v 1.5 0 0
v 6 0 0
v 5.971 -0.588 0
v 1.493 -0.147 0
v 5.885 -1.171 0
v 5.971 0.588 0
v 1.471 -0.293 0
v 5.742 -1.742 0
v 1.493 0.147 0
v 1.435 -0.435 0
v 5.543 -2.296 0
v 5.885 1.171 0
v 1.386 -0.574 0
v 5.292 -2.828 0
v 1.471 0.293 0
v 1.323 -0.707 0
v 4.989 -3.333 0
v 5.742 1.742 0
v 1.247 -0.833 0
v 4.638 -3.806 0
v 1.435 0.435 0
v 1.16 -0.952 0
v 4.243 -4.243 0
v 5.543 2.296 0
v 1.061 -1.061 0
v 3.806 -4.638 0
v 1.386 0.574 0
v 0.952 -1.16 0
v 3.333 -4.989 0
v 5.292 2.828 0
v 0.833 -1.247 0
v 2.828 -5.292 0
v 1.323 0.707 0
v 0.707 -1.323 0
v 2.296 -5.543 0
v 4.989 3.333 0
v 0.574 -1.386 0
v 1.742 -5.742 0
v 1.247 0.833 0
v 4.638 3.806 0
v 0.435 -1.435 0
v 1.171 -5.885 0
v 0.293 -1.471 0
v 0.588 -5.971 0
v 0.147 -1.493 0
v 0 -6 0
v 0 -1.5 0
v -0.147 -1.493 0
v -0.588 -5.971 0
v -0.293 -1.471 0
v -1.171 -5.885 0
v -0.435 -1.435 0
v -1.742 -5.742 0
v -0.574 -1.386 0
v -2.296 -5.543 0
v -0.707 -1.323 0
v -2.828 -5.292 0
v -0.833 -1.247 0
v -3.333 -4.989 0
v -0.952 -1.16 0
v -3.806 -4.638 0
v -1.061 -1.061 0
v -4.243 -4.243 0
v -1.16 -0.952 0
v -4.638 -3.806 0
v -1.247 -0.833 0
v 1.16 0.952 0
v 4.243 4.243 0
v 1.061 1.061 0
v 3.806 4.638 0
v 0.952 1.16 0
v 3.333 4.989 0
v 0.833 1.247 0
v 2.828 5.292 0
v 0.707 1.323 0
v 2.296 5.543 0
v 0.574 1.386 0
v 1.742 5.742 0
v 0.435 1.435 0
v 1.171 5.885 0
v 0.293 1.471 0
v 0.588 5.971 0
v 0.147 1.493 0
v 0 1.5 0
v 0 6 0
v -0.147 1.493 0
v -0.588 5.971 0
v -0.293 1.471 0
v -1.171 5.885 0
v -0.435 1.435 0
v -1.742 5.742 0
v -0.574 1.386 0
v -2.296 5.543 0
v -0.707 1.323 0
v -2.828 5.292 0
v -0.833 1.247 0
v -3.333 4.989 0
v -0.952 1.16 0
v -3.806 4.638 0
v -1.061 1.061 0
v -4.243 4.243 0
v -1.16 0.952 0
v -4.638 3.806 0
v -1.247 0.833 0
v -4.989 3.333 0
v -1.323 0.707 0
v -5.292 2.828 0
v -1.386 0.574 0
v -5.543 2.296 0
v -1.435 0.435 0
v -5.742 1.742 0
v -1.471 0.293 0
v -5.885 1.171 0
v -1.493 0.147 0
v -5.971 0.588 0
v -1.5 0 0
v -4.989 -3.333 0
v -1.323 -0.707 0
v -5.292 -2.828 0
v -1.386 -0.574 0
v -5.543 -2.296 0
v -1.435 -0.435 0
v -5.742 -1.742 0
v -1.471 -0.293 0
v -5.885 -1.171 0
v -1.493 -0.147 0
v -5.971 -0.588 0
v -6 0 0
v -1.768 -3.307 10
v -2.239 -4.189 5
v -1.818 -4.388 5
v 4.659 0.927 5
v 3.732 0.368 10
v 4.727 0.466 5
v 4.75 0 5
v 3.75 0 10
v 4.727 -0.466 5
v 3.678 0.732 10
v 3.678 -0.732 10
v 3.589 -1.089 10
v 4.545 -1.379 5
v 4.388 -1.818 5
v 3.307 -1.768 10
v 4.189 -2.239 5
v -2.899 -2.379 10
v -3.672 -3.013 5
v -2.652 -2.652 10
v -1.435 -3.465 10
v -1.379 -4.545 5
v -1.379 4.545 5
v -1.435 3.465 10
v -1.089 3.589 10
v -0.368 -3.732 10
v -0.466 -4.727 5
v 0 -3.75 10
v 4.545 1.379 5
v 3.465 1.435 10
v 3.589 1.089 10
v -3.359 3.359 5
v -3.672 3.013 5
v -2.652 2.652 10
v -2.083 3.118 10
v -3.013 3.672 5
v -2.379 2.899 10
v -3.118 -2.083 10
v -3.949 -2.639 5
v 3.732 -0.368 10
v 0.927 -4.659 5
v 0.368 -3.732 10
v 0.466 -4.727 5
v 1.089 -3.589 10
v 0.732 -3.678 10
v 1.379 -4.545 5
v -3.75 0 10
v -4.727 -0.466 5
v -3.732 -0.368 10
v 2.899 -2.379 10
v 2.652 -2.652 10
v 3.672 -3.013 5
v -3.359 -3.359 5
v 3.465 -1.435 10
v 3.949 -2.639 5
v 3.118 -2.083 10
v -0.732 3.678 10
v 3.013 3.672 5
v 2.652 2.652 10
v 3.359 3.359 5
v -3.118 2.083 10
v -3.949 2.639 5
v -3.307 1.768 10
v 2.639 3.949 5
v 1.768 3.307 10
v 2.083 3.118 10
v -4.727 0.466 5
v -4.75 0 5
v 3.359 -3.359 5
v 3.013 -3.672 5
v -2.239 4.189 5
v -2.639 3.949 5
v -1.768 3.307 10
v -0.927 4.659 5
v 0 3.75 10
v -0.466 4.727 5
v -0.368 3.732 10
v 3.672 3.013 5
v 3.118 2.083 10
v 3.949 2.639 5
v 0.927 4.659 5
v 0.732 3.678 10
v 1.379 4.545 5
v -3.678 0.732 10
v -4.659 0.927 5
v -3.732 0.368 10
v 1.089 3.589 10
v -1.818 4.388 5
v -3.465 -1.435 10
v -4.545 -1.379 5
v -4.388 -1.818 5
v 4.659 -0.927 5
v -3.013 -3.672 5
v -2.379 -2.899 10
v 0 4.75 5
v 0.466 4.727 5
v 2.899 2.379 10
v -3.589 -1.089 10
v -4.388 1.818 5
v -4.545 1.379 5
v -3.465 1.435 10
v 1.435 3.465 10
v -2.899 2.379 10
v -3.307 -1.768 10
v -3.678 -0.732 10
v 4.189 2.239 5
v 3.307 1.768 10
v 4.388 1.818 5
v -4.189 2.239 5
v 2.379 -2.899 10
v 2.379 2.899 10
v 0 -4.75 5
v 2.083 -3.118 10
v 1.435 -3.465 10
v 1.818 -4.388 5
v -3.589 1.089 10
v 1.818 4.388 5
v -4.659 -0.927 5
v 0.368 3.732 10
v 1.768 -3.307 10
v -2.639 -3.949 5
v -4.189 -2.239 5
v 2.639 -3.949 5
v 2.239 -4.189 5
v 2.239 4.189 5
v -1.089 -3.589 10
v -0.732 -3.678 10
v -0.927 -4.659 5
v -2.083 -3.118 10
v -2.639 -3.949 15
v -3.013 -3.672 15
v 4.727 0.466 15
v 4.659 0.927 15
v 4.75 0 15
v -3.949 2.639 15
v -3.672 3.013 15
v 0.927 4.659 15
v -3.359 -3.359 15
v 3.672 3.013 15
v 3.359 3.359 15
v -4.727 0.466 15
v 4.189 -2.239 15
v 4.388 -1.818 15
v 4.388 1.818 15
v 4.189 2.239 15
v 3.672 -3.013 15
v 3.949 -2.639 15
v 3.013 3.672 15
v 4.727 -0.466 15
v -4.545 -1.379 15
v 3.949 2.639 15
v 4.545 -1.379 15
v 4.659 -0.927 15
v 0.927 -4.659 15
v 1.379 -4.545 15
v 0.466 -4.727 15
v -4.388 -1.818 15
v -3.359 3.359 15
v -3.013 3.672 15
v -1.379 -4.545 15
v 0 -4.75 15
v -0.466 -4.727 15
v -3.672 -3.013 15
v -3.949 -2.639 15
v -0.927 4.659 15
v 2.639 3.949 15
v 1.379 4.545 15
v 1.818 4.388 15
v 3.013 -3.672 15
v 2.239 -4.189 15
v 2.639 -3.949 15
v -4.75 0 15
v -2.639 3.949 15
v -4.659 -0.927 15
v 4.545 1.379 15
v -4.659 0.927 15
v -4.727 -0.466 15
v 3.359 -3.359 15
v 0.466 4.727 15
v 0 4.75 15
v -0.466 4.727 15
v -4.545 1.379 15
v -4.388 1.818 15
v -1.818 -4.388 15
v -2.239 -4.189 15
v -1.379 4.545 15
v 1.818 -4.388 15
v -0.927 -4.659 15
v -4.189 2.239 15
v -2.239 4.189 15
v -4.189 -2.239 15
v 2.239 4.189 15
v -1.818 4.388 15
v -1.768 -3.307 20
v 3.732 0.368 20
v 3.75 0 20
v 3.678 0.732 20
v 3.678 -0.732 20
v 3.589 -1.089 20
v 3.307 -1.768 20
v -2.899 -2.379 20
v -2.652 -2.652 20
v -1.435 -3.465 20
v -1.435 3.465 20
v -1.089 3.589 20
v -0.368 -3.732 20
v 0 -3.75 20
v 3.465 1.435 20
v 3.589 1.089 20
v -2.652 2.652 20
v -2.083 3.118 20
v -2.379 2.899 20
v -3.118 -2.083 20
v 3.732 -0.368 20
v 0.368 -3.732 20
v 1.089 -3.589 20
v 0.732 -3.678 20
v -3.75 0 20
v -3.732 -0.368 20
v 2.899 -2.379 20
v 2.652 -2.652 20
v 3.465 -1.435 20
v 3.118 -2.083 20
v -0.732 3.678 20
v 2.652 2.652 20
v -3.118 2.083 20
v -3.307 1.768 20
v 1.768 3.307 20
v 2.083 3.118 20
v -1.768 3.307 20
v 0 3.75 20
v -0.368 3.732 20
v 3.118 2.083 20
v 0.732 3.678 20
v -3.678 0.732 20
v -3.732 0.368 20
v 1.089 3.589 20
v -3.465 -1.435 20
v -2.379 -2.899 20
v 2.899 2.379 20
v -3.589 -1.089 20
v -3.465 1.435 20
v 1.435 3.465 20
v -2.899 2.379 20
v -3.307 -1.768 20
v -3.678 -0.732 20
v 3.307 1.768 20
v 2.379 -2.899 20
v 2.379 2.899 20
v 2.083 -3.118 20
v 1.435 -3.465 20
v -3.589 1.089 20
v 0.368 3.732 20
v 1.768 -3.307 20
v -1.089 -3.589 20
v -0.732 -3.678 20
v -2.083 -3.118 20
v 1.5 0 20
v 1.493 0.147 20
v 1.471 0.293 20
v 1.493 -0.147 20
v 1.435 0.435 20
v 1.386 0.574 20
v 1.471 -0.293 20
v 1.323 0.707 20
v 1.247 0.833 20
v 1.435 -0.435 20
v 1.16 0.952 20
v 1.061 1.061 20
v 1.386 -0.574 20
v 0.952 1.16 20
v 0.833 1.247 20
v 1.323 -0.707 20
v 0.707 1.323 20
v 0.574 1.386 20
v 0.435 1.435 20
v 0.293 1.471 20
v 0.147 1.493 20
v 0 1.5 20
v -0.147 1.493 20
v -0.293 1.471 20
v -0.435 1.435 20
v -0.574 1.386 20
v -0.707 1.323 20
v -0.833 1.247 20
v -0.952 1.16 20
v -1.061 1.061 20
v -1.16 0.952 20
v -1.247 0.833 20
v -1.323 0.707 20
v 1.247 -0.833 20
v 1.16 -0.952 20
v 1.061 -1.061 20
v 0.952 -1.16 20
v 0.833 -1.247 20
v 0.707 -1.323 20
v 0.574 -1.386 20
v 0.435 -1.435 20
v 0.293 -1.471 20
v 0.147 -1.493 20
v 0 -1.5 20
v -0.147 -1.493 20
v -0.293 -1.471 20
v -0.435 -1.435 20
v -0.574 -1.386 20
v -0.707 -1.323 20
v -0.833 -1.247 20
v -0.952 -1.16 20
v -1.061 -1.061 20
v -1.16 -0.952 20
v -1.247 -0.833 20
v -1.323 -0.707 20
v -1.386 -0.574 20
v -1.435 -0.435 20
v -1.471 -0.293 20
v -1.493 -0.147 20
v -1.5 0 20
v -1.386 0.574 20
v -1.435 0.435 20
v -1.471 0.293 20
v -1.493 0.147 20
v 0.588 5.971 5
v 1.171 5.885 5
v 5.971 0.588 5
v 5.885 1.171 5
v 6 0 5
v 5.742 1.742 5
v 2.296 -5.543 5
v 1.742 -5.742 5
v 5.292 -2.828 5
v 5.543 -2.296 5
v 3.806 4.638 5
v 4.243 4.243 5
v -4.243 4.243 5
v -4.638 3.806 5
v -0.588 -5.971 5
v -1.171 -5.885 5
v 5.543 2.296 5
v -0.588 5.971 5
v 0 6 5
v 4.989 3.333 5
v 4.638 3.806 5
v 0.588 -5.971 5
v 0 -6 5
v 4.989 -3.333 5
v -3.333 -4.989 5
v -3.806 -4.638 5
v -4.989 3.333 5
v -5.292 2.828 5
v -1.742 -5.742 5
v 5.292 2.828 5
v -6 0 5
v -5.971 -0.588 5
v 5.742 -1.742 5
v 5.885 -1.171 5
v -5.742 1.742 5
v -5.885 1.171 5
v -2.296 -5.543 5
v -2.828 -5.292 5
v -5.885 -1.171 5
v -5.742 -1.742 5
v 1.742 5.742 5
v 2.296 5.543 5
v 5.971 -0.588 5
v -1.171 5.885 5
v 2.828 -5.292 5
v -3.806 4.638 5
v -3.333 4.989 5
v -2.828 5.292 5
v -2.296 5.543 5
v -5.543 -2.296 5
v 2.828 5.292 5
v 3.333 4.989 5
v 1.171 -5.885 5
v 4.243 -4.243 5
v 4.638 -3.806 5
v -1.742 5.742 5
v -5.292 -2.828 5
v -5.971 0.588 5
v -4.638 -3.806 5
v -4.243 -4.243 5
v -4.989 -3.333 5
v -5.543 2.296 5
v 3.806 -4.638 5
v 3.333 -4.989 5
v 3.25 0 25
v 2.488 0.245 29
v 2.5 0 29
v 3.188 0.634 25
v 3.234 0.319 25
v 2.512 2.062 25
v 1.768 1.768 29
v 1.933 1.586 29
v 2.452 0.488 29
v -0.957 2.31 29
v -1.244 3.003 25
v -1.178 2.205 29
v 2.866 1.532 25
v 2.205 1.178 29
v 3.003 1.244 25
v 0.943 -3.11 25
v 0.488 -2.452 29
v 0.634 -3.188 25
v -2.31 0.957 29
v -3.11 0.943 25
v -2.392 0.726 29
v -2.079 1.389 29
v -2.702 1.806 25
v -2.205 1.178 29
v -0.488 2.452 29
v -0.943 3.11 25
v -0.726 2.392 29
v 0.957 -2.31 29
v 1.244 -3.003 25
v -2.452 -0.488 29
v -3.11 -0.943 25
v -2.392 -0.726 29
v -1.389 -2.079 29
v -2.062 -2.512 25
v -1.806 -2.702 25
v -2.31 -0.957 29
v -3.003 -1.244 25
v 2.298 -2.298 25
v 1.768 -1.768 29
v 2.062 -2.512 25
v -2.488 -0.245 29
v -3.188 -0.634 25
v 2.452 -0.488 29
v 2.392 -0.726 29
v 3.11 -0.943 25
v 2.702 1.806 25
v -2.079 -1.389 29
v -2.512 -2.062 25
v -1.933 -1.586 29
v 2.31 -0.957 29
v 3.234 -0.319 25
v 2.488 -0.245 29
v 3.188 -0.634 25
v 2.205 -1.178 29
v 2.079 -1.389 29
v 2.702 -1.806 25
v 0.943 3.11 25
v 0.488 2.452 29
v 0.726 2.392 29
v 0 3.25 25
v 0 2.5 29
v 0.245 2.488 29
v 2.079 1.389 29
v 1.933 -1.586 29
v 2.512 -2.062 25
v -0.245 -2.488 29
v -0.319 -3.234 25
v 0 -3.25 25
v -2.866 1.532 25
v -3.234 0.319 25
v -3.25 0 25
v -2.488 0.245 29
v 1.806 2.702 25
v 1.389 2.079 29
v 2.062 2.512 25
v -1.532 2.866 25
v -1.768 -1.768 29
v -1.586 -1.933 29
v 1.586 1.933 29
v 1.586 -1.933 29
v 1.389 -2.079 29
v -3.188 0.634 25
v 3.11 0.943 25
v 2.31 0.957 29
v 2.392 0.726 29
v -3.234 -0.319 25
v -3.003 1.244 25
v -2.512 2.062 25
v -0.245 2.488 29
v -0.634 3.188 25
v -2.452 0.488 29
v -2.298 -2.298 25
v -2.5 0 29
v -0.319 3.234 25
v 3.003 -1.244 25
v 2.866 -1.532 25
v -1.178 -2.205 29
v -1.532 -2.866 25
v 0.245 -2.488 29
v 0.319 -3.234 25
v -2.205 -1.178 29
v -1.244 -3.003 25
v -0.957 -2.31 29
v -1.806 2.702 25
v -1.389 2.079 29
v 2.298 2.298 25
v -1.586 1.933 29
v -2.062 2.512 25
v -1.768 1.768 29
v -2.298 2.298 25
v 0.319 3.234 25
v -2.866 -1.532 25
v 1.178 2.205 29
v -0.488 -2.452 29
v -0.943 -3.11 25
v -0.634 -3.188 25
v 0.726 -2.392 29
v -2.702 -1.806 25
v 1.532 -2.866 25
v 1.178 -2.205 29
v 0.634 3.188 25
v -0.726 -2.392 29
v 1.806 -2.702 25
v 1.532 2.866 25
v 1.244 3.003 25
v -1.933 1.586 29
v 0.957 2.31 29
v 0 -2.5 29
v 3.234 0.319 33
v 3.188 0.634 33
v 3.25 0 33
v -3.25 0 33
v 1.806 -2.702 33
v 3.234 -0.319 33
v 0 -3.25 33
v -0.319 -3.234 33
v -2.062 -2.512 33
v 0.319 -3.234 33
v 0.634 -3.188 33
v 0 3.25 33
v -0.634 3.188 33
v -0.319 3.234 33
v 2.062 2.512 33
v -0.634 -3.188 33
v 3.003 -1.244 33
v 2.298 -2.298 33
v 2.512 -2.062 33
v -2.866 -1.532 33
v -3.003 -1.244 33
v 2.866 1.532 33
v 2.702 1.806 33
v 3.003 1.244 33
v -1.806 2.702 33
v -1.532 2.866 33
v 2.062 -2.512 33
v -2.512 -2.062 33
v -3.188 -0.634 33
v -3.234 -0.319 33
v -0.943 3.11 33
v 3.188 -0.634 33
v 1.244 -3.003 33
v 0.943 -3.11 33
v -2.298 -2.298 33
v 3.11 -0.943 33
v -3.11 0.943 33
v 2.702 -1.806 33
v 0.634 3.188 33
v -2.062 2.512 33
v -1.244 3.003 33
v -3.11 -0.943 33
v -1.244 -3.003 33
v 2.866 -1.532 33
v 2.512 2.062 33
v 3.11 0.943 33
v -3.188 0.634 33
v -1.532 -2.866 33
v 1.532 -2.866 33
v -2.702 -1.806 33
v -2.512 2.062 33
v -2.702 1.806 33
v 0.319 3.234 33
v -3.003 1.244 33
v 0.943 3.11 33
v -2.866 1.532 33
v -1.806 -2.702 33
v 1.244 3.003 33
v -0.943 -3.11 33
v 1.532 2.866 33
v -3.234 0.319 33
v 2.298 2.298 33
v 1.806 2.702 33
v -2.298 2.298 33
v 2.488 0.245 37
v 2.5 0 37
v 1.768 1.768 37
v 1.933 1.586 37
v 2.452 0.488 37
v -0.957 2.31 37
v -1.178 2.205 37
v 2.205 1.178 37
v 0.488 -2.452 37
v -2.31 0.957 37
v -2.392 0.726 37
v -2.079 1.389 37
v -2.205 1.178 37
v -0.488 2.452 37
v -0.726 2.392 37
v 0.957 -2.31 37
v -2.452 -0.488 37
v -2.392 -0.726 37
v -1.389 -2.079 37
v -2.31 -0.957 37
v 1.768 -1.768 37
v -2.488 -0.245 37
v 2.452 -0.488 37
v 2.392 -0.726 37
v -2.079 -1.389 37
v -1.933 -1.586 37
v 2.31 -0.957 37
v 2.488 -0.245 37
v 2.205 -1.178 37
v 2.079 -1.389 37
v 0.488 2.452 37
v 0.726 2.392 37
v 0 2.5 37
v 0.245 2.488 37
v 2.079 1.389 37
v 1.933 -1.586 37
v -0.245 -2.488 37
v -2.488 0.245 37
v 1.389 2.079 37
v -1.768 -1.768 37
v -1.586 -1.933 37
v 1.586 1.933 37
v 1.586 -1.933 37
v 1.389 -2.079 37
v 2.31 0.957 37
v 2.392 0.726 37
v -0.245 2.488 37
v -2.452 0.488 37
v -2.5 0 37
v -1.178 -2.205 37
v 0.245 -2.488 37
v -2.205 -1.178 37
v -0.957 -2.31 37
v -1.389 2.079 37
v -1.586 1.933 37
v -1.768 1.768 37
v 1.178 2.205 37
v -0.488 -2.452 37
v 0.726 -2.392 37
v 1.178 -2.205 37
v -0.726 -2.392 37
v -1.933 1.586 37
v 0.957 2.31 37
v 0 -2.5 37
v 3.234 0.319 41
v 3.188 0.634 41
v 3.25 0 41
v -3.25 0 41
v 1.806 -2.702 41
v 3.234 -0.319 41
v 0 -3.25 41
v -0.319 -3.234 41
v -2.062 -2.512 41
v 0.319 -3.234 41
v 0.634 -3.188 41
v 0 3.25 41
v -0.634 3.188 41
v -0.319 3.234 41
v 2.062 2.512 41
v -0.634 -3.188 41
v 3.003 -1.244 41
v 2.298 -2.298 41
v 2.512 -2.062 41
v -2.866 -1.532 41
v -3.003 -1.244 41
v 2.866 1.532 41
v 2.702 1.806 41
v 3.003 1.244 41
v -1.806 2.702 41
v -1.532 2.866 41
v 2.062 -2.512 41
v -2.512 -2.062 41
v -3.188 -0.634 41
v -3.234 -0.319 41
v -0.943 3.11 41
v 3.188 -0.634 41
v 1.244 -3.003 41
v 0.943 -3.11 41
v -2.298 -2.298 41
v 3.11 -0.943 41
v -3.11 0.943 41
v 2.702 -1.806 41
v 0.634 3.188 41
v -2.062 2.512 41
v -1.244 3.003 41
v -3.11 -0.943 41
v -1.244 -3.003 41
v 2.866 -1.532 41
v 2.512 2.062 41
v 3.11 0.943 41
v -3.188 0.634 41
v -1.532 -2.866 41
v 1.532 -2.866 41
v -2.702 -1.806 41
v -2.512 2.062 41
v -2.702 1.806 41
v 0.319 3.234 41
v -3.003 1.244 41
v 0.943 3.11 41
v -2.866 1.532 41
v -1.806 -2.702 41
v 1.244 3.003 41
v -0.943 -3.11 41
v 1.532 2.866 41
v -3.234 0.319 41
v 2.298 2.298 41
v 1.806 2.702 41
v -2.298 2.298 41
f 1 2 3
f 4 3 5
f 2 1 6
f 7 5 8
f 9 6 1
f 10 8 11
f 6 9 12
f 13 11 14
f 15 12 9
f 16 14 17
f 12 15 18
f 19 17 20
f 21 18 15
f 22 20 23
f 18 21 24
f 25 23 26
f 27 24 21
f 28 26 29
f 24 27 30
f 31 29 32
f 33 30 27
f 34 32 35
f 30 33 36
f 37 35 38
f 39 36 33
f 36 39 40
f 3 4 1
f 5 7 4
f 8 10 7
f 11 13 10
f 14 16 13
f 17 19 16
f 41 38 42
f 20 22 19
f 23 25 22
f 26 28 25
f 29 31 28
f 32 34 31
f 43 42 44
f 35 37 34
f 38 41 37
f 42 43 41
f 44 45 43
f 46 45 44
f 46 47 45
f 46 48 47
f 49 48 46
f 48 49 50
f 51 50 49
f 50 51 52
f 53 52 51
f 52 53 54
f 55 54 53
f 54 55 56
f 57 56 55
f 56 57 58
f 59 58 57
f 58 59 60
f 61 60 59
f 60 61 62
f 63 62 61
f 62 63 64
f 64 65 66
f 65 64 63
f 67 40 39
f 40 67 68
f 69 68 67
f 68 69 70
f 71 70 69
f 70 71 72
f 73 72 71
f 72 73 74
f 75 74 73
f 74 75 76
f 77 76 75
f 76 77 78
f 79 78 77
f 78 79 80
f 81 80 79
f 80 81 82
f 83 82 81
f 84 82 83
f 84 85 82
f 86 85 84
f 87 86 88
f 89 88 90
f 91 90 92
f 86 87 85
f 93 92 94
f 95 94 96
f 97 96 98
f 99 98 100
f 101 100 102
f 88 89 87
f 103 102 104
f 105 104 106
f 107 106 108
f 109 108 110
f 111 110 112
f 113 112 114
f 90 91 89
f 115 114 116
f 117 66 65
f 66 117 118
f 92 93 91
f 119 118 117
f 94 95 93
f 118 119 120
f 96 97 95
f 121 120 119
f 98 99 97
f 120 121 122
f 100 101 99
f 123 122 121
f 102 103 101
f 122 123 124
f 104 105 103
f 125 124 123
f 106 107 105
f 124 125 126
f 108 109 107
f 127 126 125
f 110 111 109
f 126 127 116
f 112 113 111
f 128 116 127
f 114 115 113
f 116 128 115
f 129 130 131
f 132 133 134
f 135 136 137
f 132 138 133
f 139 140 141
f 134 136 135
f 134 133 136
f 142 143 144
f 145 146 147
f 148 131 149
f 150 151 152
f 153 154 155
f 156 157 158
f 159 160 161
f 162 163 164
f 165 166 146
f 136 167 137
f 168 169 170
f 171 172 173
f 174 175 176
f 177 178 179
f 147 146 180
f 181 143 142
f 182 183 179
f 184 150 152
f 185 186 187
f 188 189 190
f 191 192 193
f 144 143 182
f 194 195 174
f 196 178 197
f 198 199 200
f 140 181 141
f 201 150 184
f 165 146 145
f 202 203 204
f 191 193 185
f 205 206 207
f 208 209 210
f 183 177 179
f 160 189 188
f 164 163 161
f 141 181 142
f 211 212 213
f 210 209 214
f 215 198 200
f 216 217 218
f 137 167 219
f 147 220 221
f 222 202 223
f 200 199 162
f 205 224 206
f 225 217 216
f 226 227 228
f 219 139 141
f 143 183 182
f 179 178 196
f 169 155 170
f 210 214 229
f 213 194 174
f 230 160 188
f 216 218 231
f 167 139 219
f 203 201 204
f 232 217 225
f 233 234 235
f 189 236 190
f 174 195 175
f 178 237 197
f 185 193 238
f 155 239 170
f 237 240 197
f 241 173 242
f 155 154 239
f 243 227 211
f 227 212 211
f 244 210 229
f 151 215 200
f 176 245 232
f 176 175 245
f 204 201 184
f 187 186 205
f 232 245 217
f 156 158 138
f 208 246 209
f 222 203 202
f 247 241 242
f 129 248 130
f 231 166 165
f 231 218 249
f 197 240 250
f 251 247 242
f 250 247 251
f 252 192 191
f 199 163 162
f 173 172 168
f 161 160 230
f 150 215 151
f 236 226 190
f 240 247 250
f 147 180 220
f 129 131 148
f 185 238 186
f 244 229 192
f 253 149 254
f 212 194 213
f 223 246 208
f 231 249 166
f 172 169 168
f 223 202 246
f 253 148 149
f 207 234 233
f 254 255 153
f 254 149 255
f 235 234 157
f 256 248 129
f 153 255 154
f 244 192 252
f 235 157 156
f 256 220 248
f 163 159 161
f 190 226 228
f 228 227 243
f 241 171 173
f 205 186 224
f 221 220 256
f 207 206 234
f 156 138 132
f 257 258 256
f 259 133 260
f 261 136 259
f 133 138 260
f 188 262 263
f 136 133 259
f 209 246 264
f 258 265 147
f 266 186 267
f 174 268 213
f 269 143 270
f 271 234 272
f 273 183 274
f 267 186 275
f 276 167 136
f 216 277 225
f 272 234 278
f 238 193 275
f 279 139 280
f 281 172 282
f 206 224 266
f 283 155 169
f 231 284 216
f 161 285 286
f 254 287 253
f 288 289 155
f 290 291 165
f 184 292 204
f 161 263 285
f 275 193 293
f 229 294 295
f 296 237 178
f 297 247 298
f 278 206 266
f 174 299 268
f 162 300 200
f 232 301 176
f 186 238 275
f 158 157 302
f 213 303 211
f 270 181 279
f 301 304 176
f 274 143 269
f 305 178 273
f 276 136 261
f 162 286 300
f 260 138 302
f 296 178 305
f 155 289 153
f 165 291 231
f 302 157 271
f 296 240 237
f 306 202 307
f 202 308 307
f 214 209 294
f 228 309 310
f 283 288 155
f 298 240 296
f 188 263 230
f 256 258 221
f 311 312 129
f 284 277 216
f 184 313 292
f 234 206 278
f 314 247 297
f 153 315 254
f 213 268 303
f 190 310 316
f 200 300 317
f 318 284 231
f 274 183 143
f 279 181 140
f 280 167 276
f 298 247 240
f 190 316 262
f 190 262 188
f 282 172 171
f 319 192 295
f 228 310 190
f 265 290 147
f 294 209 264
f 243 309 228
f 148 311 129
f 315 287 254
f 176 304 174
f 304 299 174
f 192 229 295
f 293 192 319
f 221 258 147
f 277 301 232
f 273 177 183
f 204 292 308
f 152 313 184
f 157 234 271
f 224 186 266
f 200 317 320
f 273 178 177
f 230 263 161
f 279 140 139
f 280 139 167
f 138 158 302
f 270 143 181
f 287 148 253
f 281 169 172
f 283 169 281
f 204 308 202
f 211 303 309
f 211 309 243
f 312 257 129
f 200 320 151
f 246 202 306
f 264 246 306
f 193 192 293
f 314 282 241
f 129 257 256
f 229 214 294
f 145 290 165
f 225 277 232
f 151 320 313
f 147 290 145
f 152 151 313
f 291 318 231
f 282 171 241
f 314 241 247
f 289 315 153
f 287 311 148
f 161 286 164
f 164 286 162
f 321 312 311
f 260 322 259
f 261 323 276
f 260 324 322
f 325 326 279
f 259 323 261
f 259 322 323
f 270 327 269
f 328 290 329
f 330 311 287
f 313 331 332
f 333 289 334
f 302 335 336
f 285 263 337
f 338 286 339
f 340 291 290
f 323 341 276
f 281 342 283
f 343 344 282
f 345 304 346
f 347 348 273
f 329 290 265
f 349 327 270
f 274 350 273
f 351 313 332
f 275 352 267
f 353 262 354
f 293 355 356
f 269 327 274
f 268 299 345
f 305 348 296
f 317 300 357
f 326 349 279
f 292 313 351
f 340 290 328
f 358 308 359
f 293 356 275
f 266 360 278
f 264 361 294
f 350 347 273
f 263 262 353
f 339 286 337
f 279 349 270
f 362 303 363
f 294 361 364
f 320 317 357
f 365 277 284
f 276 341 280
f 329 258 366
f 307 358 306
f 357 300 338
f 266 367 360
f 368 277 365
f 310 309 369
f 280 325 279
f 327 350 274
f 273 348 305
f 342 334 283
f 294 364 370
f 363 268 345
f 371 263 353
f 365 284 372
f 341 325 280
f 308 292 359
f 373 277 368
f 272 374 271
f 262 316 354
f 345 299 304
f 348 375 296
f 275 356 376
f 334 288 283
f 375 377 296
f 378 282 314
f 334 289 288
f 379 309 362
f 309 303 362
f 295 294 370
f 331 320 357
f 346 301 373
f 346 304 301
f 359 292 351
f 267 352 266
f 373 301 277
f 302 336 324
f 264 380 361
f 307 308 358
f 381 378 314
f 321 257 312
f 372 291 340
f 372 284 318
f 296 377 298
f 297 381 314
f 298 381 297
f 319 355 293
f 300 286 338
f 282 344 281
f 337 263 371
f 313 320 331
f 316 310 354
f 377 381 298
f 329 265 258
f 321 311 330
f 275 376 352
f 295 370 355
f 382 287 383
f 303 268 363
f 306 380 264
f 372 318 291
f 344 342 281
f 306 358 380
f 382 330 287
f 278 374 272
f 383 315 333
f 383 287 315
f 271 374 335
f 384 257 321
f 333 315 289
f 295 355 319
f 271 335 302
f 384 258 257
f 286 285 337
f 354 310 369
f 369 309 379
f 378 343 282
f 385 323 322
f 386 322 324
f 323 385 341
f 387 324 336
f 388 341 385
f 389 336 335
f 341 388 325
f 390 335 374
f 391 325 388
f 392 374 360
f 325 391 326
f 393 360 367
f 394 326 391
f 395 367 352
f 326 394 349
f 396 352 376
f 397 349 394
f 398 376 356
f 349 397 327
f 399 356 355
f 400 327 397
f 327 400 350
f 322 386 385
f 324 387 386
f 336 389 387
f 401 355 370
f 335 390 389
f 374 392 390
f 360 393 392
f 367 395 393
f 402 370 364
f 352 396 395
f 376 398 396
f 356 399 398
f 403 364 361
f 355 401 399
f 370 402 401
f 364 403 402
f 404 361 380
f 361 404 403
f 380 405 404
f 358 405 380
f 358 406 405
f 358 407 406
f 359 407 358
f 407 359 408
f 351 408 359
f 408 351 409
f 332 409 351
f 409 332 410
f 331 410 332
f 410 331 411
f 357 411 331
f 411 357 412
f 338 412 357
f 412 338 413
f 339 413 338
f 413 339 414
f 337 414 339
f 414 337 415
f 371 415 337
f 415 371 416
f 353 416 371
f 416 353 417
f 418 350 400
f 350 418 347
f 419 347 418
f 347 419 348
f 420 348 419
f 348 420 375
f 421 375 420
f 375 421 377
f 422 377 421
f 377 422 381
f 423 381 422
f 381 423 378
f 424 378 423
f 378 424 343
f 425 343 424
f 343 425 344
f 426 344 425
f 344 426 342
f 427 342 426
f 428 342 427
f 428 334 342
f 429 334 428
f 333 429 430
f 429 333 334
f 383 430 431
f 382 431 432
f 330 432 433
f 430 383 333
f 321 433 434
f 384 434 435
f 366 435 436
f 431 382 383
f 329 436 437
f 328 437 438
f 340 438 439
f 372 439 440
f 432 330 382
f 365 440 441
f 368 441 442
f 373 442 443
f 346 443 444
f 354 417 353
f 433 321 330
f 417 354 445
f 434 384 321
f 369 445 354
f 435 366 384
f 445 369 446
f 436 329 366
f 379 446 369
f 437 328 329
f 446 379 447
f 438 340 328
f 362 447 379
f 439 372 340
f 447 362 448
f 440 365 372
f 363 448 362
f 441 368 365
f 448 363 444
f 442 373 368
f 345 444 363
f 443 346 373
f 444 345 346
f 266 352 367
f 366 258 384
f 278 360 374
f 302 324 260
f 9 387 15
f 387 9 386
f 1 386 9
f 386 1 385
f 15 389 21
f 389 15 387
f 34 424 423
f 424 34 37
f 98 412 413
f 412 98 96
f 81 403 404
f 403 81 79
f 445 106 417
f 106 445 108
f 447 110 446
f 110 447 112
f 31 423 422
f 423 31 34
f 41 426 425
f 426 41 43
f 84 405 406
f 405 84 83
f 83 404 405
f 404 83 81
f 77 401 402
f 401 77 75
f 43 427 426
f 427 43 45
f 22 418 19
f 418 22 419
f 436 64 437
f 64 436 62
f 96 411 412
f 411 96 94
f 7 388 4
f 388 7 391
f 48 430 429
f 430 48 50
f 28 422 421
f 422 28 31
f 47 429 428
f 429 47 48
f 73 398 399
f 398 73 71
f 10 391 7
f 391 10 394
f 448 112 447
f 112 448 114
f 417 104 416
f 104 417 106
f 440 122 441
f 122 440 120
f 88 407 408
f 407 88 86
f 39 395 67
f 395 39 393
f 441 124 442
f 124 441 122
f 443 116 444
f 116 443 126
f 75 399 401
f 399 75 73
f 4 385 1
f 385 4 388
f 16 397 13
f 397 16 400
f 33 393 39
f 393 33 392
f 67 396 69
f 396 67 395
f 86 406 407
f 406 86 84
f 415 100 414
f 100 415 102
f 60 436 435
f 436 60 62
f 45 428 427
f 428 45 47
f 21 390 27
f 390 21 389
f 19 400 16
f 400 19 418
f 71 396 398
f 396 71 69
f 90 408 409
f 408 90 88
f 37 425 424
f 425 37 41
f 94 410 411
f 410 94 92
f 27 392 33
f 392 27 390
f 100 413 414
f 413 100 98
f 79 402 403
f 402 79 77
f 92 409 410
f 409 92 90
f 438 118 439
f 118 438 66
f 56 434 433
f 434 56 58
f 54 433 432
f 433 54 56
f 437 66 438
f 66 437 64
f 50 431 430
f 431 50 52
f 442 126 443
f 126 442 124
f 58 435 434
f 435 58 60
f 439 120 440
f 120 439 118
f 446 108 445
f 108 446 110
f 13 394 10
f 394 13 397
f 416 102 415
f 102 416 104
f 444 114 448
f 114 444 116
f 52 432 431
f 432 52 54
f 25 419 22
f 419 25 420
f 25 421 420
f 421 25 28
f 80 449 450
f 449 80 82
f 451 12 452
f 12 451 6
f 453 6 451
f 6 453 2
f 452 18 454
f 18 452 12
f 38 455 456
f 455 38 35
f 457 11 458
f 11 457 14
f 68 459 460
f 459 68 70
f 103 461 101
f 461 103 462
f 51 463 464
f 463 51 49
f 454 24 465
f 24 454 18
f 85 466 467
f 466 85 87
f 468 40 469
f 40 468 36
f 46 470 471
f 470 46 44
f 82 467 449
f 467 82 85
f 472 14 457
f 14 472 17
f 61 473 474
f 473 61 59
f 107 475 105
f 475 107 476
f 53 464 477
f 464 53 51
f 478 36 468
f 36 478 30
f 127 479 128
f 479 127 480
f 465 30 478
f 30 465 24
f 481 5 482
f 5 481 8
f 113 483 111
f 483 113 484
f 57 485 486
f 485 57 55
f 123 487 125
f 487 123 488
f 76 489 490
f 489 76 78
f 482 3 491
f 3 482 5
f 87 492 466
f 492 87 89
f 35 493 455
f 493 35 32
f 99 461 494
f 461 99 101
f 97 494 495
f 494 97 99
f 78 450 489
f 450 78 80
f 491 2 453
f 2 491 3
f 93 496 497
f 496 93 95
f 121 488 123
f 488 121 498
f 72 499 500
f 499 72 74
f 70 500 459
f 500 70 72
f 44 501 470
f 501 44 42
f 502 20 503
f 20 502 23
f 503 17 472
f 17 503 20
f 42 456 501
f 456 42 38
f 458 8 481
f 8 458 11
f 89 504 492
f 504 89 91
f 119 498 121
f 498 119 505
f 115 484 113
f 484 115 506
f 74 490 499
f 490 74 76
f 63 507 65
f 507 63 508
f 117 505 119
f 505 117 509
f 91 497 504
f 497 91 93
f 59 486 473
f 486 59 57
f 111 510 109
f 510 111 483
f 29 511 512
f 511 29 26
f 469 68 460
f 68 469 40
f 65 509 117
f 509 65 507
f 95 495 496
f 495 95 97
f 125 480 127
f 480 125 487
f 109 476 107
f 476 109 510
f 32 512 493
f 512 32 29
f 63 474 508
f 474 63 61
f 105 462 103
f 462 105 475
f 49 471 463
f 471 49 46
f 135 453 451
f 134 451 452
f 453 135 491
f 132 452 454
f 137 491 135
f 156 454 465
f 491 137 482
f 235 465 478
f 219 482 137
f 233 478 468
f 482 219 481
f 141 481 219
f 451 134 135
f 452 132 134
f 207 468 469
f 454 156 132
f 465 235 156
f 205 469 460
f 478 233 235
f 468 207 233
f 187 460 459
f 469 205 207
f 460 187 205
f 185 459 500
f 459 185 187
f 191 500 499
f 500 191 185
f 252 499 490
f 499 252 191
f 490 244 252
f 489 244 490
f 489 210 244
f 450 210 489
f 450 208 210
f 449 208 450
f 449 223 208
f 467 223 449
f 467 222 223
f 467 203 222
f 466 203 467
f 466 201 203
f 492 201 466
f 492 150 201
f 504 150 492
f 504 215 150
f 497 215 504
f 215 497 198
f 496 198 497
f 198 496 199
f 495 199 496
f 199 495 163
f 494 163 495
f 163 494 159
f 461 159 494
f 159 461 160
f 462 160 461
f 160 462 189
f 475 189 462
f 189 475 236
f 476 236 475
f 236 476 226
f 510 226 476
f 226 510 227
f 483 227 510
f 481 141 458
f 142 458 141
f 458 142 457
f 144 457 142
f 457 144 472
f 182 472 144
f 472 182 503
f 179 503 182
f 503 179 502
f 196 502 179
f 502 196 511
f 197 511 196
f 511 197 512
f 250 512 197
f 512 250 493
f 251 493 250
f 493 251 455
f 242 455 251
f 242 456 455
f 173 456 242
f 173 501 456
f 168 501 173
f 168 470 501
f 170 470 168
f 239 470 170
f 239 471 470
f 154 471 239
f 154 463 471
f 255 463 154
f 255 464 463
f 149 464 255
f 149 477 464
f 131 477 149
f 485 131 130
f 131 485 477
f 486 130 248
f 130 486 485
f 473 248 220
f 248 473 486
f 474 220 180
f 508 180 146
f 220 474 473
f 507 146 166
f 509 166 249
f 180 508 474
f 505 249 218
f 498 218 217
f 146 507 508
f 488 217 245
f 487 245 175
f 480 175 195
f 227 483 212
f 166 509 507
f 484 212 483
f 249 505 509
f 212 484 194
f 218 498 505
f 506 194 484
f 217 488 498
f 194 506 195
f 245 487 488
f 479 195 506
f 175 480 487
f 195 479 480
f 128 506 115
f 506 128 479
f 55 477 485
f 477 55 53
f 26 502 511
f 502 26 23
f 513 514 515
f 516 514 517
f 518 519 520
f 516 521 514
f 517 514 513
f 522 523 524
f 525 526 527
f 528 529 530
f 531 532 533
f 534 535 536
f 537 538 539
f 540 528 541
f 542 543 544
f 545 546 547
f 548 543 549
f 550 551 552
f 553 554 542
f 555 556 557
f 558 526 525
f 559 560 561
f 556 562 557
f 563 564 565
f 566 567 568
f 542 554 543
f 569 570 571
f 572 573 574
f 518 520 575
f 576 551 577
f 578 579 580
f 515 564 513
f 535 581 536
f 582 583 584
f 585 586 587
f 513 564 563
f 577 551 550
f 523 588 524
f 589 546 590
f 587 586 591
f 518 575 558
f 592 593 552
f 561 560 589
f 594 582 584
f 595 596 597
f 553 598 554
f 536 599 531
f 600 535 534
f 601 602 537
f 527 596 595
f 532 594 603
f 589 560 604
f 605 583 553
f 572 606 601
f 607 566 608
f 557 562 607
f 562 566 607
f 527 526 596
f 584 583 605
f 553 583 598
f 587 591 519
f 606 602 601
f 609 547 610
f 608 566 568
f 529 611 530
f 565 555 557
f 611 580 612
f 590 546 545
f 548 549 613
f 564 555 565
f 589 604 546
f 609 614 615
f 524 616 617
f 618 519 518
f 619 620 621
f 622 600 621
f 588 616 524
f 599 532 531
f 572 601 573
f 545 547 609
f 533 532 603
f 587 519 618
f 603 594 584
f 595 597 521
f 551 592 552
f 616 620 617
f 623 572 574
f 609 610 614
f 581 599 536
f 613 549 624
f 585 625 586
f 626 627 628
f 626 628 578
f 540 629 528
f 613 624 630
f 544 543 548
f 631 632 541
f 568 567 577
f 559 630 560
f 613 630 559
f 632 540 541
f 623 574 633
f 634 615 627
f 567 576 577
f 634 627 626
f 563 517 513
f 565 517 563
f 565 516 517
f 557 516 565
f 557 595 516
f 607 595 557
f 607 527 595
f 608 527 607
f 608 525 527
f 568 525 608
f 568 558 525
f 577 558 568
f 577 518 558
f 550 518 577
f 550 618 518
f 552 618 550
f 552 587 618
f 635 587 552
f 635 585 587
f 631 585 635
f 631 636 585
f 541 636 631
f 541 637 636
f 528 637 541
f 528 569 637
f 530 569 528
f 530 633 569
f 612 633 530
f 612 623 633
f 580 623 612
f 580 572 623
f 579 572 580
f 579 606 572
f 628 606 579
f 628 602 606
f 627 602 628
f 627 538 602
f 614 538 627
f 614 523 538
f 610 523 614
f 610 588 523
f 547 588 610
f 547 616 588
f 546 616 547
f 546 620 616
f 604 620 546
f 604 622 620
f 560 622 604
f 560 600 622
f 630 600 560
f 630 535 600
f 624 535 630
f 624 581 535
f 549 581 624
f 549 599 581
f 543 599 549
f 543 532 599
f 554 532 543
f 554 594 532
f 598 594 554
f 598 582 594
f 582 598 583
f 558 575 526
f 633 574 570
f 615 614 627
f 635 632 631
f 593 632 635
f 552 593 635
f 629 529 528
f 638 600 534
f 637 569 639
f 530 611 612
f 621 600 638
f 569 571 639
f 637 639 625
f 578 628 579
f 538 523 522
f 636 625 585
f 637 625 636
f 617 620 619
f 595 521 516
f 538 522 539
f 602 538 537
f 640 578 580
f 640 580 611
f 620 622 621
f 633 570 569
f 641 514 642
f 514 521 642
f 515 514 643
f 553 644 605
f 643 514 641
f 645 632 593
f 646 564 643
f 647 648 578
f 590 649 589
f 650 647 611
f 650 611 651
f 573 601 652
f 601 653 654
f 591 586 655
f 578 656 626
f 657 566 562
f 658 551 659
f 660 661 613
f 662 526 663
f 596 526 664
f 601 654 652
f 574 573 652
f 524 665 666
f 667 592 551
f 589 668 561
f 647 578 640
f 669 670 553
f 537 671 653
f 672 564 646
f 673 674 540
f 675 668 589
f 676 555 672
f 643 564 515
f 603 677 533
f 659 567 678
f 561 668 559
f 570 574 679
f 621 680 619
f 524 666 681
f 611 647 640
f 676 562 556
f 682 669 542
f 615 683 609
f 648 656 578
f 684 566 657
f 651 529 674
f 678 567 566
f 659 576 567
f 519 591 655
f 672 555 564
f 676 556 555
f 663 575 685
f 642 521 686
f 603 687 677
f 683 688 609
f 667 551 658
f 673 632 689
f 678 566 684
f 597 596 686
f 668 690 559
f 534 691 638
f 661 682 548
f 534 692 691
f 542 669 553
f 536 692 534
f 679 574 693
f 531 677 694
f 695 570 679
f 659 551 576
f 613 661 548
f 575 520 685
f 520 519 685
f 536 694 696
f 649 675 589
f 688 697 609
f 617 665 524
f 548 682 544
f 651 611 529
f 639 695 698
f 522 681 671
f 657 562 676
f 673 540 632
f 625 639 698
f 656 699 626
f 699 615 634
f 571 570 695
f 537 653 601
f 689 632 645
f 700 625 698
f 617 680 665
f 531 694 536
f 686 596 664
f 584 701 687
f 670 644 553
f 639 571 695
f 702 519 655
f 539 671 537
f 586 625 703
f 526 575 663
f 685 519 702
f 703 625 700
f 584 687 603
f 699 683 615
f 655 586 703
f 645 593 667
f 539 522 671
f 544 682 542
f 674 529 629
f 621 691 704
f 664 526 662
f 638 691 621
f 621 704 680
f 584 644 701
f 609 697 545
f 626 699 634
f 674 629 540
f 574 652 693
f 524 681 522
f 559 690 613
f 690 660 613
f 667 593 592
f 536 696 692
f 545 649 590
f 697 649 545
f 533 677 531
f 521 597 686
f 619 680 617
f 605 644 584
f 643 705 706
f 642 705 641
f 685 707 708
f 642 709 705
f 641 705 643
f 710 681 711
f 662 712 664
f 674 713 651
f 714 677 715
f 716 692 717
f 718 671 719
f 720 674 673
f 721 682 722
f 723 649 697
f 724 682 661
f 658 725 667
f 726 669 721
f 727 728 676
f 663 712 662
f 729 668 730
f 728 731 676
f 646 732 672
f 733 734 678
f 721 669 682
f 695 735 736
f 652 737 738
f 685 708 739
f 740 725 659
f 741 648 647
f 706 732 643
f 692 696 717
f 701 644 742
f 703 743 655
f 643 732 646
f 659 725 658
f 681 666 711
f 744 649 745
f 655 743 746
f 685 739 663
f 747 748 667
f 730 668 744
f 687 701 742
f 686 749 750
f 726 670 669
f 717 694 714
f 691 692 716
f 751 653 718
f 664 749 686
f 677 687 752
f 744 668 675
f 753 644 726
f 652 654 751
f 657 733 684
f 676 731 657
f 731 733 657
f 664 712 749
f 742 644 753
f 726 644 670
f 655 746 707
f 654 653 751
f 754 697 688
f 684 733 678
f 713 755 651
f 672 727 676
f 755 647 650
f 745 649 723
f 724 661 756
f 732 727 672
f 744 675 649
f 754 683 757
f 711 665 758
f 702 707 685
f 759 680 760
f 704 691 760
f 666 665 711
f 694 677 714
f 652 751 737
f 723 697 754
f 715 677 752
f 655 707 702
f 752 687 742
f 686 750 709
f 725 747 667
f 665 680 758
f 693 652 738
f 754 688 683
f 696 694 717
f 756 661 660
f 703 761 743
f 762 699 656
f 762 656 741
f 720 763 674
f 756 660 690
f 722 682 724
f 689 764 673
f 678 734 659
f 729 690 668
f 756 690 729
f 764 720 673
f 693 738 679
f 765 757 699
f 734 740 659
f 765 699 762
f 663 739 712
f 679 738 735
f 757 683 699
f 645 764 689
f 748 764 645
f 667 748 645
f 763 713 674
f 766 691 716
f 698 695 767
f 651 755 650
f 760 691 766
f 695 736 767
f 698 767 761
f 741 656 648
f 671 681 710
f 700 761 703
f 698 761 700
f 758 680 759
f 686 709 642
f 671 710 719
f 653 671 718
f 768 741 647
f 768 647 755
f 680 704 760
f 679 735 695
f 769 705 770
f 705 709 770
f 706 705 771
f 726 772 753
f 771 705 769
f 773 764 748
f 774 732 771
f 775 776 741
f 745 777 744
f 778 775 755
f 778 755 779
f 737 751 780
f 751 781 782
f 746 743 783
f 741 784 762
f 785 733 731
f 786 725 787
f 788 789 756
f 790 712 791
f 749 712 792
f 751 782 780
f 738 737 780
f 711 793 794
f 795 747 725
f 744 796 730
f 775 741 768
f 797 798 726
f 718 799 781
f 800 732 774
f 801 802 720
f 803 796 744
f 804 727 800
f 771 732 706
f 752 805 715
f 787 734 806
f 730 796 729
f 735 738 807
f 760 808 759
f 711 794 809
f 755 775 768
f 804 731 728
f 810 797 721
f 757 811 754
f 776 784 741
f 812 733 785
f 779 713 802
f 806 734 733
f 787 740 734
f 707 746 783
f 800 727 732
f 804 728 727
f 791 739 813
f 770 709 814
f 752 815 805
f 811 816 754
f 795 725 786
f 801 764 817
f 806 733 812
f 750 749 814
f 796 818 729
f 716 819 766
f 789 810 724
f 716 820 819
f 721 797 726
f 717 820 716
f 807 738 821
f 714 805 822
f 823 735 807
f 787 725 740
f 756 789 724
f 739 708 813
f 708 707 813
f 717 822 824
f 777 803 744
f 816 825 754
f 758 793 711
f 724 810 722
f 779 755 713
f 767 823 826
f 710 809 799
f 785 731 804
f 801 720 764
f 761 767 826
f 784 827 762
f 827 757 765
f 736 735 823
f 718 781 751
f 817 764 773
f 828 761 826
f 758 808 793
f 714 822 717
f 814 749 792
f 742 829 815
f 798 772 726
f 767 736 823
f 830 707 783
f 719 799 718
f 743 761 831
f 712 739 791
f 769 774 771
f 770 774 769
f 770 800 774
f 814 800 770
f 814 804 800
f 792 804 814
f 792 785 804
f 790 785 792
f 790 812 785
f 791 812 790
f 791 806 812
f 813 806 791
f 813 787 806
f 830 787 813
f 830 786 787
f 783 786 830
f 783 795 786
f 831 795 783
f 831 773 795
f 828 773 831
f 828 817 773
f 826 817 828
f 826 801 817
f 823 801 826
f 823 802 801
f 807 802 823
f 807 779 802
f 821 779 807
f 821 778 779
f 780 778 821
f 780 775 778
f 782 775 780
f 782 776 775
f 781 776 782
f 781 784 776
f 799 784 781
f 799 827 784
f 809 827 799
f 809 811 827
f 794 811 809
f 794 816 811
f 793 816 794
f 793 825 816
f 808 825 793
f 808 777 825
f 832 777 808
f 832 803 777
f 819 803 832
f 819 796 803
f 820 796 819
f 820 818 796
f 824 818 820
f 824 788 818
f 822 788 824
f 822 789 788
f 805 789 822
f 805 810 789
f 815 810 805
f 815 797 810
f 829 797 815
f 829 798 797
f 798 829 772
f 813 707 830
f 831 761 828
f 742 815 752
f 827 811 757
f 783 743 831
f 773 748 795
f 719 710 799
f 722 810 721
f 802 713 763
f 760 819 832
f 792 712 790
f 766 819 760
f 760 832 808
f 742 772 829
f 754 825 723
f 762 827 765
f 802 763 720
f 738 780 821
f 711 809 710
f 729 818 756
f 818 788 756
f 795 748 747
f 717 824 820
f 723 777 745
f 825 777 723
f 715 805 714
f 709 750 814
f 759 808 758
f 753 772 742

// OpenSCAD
// Hose-barb reducer for 8mm to 5mm silicone tubing
// Print orientation: upright along Z axis

// Parameters
bore_diameter = 3;              // Internal bore diameter (mm)
collar_diameter = 12;           // Collar outer diameter (mm)
collar_height = 5;              // Collar height (mm) - from z=20 to z=25

// 8 mm side barb parameters (2 barbs, each 10mm tall)
barb8_height = 10;              // Height of each 8mm barb (mm)
barb8_bottom_diameter = 7.5;    // Bottom diameter of 8mm barb (mm)
barb8_top_diameter = 9.5;       // Top diameter of 8mm barb (mm)
num_barb8 = 2;                  // Number of 8mm barbs

// 5 mm side barb parameters (2 barbs, each 8mm tall)
barb5_height = 8;               // Height of each 5mm barb (mm)
barb5_bottom_diameter = 6.5;    // Bottom diameter of 5mm barb (mm)
barb5_top_diameter = 5.0;       // Top diameter of 5mm barb (mm)
num_barb5 = 2;                  // Number of 5mm barbs

// Total heights
z8_start = 0;
z8_end = z8_start + num_barb8 * barb8_height;  // 20
z_collar_start = z8_end;                        // 20
z_collar_end = z_collar_start + collar_height; // 25
z5_start = z_collar_end;                        // 25
z5_end = z5_start + num_barb5 * barb5_height;  // 41

// Resolution
$fn = 64;

module barb_section_with_step(start_z, height, bottom_d, top_d, num_barbs) {
    total_height = num_barbs * height;
    
    // Base cylinder with bore
    difference() {
        // Outer shape with sawtooth profile
        union() {
            for (i = [0 : num_barbs - 1]) {
                z_barb_start = start_z + i * height;
                // Create the sawtooth profile: linear up then step back
                // First part: linear taper from bottom to top
                translate([0, 0, z_barb_start]) {
                    linear_extrude(height = height/2, scale = top_d / bottom_d) {
                        circle(d = bottom_d);
                    }
                }
                // Second part: step back to bottom diameter
                translate([0, 0, z_barb_start + height/2]) {
                    linear_extrude(height = height/2, scale = bottom_d / top_d) {
                        circle(d = top_d);
                    }
                }
            }
        }
        
        // Bore through entire section
        translate([0, 0, -0.01]) {
            cylinder(h = total_height + 0.02, d = bore_diameter);
        }
    }
}

module collar_section(z_start, z_end, outer_d, inner_d) {
    total_height = z_end - z_start;
    difference() {
        cylinder(h = total_height, d = outer_d);
        translate([0, 0, -0.01]) {
            cylinder(h = total_height + 0.02, d = inner_d);
        }
    }
}

// Build the complete reducer
module reducer() {
    // 8 mm barbs section (z = 0 to 20)
    barb_section_with_step(z8_start, barb8_height, barb8_bottom_diameter, barb8_top_diameter, num_barb8);
    
    // Collar section (z = 20 to 25)
    collar_section(z_collar_start, z_collar_end, collar_diameter, bore_diameter);
    
    // 5 mm barbs section (z = 25 to 41)
    barb_section_with_step(z5_start, barb5_height, barb5_bottom_diameter, barb5_top_diameter, num_barb5);
}

// Render the reducer
reducer();
